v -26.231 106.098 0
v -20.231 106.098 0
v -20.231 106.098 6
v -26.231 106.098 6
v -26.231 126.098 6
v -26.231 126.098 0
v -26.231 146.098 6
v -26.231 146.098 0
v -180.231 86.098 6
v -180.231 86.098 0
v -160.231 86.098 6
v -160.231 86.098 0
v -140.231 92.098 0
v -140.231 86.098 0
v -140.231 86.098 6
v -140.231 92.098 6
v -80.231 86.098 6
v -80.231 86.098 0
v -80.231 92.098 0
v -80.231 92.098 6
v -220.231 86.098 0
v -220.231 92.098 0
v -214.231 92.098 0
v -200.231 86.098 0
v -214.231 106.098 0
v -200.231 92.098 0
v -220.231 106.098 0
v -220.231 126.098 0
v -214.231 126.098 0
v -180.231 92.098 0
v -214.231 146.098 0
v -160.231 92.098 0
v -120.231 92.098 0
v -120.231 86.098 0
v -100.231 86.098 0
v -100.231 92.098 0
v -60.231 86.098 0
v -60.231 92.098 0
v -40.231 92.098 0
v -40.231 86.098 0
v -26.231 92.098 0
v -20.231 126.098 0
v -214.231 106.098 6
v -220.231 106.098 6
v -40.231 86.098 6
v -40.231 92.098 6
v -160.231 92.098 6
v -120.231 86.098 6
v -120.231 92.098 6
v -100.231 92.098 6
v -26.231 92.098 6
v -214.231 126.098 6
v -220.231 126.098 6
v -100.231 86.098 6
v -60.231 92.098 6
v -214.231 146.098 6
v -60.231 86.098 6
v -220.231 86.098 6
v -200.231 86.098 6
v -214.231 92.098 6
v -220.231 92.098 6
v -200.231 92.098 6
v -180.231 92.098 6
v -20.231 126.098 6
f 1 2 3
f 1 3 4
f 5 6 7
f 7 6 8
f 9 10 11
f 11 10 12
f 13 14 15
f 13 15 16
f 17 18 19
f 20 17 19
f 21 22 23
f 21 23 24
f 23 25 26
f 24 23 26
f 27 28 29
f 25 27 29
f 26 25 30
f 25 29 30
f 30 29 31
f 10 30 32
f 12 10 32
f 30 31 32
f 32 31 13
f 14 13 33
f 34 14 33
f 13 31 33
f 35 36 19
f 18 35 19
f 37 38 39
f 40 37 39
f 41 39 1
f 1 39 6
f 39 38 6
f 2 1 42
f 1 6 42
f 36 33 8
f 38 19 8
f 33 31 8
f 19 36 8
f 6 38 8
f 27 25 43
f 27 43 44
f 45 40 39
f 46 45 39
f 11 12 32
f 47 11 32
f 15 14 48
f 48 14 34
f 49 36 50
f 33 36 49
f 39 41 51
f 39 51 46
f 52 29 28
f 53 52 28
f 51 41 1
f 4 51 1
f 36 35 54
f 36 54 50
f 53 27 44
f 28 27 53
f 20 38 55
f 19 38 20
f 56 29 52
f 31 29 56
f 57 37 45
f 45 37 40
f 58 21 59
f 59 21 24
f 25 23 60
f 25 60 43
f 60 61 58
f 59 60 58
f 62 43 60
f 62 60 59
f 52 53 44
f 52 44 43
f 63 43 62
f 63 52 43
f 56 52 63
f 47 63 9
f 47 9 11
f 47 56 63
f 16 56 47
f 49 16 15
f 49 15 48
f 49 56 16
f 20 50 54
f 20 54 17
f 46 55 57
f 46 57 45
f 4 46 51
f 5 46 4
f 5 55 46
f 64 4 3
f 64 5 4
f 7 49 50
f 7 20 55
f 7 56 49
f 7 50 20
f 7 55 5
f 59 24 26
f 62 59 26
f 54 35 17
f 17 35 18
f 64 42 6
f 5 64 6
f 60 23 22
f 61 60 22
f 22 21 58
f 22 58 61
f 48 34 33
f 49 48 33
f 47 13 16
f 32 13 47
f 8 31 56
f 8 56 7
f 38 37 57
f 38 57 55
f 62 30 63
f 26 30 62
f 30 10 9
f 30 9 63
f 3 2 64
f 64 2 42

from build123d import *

# Parameters (mm, degrees)
SKETCH1_W           = 200
SKETCH1_H           = 60
BOSS_EXTRUDE1_DEPTH = 6
SKETCH2_W           = 20
SKETCH2_H           = 6
CUT_EXTRUDE1_DEPTH  = 10
LPATTERN1_COUNT     = 5
LPATTERN1_PITCH     = 40
SKETCH3_W           = 6
SKETCH3_H           = 20
CUT_EXTRUDE2_DEPTH  = 10
SKETCH4_W           = 6
SKETCH4_H           = 20
CUT_EXTRUDE3_DEPTH  = 10
SKETCH6_W           = 6
SKETCH6_H           = 14
CUT_EXTRUDE4_DEPTH  = 10
SKETCH7_W           = 6
SKETCH7_H           = 14
CUT_EXTRUDE5_DEPTH  = 10


with BuildPart() as part:
    # Sketch1 → Boss-Extrude1 (new body)
    with BuildSketch(Plane.XY):
        with Locations((-120.231213873, 116.098265896)):
            Rectangle(SKETCH1_W, SKETCH1_H)
    extrude(amount=BOSS_EXTRUDE1_DEPTH)

    # Sketch2 → Cut-Extrude1 (cut)
    with BuildSketch(Plane(origin=(0, 0, 0), x_dir=(-1, 0, 0), z_dir=(0, 0, -1))):
        with Locations((30.231213873, 89.098265896)):
            Rectangle(SKETCH2_W, SKETCH2_H)
    cut_extrude1 = extrude(amount=-CUT_EXTRUDE1_DEPTH, mode=Mode.SUBTRACT)

    # LPattern1: Cut-Extrude1 ×5
    with Locations(*[(-i * LPATTERN1_PITCH, 0, 0) for i in range(1, LPATTERN1_COUNT)]):
        add(cut_extrude1, mode=Mode.SUBTRACT)

    # Sketch3 → Cut-Extrude2 (cut)
    with BuildSketch(Plane(origin=(0, 0, 0), x_dir=(-1, 0, 0), z_dir=(0, 0, -1))):
        with Locations((217.231213873, 136.098265896)):
            Rectangle(SKETCH3_W, SKETCH3_H)
    extrude(amount=-CUT_EXTRUDE2_DEPTH, mode=Mode.SUBTRACT)

    # Sketch4 → Cut-Extrude3 (cut)
    with BuildSketch(Plane(origin=(0, 0, 0), x_dir=(-1, 0, 0), z_dir=(0, 0, -1))):
        with Locations((23.231213873, 136.098265896)):
            Rectangle(SKETCH4_W, SKETCH4_H)
    extrude(amount=-CUT_EXTRUDE3_DEPTH, mode=Mode.SUBTRACT)

    # Sketch6 → Cut-Extrude4 (cut)
    with BuildSketch(Plane(origin=(0, 0, 0), x_dir=(-1, 0, 0), z_dir=(0, 0, -1))):
        with Locations((217.231213873, 99.098265896)):
            Rectangle(SKETCH6_W, SKETCH6_H)
    extrude(amount=-CUT_EXTRUDE4_DEPTH, mode=Mode.SUBTRACT)

    # Sketch7 → Cut-Extrude5 (cut)
    with BuildSketch(Plane(origin=(0, 0, 0), x_dir=(-1, 0, 0), z_dir=(0, 0, -1))):
        with Locations((23.231213873, 99.098265896)):
            Rectangle(SKETCH7_W, SKETCH7_H)
    extrude(amount=-CUT_EXTRUDE5_DEPTH, mode=Mode.SUBTRACT)


solid = part.part
